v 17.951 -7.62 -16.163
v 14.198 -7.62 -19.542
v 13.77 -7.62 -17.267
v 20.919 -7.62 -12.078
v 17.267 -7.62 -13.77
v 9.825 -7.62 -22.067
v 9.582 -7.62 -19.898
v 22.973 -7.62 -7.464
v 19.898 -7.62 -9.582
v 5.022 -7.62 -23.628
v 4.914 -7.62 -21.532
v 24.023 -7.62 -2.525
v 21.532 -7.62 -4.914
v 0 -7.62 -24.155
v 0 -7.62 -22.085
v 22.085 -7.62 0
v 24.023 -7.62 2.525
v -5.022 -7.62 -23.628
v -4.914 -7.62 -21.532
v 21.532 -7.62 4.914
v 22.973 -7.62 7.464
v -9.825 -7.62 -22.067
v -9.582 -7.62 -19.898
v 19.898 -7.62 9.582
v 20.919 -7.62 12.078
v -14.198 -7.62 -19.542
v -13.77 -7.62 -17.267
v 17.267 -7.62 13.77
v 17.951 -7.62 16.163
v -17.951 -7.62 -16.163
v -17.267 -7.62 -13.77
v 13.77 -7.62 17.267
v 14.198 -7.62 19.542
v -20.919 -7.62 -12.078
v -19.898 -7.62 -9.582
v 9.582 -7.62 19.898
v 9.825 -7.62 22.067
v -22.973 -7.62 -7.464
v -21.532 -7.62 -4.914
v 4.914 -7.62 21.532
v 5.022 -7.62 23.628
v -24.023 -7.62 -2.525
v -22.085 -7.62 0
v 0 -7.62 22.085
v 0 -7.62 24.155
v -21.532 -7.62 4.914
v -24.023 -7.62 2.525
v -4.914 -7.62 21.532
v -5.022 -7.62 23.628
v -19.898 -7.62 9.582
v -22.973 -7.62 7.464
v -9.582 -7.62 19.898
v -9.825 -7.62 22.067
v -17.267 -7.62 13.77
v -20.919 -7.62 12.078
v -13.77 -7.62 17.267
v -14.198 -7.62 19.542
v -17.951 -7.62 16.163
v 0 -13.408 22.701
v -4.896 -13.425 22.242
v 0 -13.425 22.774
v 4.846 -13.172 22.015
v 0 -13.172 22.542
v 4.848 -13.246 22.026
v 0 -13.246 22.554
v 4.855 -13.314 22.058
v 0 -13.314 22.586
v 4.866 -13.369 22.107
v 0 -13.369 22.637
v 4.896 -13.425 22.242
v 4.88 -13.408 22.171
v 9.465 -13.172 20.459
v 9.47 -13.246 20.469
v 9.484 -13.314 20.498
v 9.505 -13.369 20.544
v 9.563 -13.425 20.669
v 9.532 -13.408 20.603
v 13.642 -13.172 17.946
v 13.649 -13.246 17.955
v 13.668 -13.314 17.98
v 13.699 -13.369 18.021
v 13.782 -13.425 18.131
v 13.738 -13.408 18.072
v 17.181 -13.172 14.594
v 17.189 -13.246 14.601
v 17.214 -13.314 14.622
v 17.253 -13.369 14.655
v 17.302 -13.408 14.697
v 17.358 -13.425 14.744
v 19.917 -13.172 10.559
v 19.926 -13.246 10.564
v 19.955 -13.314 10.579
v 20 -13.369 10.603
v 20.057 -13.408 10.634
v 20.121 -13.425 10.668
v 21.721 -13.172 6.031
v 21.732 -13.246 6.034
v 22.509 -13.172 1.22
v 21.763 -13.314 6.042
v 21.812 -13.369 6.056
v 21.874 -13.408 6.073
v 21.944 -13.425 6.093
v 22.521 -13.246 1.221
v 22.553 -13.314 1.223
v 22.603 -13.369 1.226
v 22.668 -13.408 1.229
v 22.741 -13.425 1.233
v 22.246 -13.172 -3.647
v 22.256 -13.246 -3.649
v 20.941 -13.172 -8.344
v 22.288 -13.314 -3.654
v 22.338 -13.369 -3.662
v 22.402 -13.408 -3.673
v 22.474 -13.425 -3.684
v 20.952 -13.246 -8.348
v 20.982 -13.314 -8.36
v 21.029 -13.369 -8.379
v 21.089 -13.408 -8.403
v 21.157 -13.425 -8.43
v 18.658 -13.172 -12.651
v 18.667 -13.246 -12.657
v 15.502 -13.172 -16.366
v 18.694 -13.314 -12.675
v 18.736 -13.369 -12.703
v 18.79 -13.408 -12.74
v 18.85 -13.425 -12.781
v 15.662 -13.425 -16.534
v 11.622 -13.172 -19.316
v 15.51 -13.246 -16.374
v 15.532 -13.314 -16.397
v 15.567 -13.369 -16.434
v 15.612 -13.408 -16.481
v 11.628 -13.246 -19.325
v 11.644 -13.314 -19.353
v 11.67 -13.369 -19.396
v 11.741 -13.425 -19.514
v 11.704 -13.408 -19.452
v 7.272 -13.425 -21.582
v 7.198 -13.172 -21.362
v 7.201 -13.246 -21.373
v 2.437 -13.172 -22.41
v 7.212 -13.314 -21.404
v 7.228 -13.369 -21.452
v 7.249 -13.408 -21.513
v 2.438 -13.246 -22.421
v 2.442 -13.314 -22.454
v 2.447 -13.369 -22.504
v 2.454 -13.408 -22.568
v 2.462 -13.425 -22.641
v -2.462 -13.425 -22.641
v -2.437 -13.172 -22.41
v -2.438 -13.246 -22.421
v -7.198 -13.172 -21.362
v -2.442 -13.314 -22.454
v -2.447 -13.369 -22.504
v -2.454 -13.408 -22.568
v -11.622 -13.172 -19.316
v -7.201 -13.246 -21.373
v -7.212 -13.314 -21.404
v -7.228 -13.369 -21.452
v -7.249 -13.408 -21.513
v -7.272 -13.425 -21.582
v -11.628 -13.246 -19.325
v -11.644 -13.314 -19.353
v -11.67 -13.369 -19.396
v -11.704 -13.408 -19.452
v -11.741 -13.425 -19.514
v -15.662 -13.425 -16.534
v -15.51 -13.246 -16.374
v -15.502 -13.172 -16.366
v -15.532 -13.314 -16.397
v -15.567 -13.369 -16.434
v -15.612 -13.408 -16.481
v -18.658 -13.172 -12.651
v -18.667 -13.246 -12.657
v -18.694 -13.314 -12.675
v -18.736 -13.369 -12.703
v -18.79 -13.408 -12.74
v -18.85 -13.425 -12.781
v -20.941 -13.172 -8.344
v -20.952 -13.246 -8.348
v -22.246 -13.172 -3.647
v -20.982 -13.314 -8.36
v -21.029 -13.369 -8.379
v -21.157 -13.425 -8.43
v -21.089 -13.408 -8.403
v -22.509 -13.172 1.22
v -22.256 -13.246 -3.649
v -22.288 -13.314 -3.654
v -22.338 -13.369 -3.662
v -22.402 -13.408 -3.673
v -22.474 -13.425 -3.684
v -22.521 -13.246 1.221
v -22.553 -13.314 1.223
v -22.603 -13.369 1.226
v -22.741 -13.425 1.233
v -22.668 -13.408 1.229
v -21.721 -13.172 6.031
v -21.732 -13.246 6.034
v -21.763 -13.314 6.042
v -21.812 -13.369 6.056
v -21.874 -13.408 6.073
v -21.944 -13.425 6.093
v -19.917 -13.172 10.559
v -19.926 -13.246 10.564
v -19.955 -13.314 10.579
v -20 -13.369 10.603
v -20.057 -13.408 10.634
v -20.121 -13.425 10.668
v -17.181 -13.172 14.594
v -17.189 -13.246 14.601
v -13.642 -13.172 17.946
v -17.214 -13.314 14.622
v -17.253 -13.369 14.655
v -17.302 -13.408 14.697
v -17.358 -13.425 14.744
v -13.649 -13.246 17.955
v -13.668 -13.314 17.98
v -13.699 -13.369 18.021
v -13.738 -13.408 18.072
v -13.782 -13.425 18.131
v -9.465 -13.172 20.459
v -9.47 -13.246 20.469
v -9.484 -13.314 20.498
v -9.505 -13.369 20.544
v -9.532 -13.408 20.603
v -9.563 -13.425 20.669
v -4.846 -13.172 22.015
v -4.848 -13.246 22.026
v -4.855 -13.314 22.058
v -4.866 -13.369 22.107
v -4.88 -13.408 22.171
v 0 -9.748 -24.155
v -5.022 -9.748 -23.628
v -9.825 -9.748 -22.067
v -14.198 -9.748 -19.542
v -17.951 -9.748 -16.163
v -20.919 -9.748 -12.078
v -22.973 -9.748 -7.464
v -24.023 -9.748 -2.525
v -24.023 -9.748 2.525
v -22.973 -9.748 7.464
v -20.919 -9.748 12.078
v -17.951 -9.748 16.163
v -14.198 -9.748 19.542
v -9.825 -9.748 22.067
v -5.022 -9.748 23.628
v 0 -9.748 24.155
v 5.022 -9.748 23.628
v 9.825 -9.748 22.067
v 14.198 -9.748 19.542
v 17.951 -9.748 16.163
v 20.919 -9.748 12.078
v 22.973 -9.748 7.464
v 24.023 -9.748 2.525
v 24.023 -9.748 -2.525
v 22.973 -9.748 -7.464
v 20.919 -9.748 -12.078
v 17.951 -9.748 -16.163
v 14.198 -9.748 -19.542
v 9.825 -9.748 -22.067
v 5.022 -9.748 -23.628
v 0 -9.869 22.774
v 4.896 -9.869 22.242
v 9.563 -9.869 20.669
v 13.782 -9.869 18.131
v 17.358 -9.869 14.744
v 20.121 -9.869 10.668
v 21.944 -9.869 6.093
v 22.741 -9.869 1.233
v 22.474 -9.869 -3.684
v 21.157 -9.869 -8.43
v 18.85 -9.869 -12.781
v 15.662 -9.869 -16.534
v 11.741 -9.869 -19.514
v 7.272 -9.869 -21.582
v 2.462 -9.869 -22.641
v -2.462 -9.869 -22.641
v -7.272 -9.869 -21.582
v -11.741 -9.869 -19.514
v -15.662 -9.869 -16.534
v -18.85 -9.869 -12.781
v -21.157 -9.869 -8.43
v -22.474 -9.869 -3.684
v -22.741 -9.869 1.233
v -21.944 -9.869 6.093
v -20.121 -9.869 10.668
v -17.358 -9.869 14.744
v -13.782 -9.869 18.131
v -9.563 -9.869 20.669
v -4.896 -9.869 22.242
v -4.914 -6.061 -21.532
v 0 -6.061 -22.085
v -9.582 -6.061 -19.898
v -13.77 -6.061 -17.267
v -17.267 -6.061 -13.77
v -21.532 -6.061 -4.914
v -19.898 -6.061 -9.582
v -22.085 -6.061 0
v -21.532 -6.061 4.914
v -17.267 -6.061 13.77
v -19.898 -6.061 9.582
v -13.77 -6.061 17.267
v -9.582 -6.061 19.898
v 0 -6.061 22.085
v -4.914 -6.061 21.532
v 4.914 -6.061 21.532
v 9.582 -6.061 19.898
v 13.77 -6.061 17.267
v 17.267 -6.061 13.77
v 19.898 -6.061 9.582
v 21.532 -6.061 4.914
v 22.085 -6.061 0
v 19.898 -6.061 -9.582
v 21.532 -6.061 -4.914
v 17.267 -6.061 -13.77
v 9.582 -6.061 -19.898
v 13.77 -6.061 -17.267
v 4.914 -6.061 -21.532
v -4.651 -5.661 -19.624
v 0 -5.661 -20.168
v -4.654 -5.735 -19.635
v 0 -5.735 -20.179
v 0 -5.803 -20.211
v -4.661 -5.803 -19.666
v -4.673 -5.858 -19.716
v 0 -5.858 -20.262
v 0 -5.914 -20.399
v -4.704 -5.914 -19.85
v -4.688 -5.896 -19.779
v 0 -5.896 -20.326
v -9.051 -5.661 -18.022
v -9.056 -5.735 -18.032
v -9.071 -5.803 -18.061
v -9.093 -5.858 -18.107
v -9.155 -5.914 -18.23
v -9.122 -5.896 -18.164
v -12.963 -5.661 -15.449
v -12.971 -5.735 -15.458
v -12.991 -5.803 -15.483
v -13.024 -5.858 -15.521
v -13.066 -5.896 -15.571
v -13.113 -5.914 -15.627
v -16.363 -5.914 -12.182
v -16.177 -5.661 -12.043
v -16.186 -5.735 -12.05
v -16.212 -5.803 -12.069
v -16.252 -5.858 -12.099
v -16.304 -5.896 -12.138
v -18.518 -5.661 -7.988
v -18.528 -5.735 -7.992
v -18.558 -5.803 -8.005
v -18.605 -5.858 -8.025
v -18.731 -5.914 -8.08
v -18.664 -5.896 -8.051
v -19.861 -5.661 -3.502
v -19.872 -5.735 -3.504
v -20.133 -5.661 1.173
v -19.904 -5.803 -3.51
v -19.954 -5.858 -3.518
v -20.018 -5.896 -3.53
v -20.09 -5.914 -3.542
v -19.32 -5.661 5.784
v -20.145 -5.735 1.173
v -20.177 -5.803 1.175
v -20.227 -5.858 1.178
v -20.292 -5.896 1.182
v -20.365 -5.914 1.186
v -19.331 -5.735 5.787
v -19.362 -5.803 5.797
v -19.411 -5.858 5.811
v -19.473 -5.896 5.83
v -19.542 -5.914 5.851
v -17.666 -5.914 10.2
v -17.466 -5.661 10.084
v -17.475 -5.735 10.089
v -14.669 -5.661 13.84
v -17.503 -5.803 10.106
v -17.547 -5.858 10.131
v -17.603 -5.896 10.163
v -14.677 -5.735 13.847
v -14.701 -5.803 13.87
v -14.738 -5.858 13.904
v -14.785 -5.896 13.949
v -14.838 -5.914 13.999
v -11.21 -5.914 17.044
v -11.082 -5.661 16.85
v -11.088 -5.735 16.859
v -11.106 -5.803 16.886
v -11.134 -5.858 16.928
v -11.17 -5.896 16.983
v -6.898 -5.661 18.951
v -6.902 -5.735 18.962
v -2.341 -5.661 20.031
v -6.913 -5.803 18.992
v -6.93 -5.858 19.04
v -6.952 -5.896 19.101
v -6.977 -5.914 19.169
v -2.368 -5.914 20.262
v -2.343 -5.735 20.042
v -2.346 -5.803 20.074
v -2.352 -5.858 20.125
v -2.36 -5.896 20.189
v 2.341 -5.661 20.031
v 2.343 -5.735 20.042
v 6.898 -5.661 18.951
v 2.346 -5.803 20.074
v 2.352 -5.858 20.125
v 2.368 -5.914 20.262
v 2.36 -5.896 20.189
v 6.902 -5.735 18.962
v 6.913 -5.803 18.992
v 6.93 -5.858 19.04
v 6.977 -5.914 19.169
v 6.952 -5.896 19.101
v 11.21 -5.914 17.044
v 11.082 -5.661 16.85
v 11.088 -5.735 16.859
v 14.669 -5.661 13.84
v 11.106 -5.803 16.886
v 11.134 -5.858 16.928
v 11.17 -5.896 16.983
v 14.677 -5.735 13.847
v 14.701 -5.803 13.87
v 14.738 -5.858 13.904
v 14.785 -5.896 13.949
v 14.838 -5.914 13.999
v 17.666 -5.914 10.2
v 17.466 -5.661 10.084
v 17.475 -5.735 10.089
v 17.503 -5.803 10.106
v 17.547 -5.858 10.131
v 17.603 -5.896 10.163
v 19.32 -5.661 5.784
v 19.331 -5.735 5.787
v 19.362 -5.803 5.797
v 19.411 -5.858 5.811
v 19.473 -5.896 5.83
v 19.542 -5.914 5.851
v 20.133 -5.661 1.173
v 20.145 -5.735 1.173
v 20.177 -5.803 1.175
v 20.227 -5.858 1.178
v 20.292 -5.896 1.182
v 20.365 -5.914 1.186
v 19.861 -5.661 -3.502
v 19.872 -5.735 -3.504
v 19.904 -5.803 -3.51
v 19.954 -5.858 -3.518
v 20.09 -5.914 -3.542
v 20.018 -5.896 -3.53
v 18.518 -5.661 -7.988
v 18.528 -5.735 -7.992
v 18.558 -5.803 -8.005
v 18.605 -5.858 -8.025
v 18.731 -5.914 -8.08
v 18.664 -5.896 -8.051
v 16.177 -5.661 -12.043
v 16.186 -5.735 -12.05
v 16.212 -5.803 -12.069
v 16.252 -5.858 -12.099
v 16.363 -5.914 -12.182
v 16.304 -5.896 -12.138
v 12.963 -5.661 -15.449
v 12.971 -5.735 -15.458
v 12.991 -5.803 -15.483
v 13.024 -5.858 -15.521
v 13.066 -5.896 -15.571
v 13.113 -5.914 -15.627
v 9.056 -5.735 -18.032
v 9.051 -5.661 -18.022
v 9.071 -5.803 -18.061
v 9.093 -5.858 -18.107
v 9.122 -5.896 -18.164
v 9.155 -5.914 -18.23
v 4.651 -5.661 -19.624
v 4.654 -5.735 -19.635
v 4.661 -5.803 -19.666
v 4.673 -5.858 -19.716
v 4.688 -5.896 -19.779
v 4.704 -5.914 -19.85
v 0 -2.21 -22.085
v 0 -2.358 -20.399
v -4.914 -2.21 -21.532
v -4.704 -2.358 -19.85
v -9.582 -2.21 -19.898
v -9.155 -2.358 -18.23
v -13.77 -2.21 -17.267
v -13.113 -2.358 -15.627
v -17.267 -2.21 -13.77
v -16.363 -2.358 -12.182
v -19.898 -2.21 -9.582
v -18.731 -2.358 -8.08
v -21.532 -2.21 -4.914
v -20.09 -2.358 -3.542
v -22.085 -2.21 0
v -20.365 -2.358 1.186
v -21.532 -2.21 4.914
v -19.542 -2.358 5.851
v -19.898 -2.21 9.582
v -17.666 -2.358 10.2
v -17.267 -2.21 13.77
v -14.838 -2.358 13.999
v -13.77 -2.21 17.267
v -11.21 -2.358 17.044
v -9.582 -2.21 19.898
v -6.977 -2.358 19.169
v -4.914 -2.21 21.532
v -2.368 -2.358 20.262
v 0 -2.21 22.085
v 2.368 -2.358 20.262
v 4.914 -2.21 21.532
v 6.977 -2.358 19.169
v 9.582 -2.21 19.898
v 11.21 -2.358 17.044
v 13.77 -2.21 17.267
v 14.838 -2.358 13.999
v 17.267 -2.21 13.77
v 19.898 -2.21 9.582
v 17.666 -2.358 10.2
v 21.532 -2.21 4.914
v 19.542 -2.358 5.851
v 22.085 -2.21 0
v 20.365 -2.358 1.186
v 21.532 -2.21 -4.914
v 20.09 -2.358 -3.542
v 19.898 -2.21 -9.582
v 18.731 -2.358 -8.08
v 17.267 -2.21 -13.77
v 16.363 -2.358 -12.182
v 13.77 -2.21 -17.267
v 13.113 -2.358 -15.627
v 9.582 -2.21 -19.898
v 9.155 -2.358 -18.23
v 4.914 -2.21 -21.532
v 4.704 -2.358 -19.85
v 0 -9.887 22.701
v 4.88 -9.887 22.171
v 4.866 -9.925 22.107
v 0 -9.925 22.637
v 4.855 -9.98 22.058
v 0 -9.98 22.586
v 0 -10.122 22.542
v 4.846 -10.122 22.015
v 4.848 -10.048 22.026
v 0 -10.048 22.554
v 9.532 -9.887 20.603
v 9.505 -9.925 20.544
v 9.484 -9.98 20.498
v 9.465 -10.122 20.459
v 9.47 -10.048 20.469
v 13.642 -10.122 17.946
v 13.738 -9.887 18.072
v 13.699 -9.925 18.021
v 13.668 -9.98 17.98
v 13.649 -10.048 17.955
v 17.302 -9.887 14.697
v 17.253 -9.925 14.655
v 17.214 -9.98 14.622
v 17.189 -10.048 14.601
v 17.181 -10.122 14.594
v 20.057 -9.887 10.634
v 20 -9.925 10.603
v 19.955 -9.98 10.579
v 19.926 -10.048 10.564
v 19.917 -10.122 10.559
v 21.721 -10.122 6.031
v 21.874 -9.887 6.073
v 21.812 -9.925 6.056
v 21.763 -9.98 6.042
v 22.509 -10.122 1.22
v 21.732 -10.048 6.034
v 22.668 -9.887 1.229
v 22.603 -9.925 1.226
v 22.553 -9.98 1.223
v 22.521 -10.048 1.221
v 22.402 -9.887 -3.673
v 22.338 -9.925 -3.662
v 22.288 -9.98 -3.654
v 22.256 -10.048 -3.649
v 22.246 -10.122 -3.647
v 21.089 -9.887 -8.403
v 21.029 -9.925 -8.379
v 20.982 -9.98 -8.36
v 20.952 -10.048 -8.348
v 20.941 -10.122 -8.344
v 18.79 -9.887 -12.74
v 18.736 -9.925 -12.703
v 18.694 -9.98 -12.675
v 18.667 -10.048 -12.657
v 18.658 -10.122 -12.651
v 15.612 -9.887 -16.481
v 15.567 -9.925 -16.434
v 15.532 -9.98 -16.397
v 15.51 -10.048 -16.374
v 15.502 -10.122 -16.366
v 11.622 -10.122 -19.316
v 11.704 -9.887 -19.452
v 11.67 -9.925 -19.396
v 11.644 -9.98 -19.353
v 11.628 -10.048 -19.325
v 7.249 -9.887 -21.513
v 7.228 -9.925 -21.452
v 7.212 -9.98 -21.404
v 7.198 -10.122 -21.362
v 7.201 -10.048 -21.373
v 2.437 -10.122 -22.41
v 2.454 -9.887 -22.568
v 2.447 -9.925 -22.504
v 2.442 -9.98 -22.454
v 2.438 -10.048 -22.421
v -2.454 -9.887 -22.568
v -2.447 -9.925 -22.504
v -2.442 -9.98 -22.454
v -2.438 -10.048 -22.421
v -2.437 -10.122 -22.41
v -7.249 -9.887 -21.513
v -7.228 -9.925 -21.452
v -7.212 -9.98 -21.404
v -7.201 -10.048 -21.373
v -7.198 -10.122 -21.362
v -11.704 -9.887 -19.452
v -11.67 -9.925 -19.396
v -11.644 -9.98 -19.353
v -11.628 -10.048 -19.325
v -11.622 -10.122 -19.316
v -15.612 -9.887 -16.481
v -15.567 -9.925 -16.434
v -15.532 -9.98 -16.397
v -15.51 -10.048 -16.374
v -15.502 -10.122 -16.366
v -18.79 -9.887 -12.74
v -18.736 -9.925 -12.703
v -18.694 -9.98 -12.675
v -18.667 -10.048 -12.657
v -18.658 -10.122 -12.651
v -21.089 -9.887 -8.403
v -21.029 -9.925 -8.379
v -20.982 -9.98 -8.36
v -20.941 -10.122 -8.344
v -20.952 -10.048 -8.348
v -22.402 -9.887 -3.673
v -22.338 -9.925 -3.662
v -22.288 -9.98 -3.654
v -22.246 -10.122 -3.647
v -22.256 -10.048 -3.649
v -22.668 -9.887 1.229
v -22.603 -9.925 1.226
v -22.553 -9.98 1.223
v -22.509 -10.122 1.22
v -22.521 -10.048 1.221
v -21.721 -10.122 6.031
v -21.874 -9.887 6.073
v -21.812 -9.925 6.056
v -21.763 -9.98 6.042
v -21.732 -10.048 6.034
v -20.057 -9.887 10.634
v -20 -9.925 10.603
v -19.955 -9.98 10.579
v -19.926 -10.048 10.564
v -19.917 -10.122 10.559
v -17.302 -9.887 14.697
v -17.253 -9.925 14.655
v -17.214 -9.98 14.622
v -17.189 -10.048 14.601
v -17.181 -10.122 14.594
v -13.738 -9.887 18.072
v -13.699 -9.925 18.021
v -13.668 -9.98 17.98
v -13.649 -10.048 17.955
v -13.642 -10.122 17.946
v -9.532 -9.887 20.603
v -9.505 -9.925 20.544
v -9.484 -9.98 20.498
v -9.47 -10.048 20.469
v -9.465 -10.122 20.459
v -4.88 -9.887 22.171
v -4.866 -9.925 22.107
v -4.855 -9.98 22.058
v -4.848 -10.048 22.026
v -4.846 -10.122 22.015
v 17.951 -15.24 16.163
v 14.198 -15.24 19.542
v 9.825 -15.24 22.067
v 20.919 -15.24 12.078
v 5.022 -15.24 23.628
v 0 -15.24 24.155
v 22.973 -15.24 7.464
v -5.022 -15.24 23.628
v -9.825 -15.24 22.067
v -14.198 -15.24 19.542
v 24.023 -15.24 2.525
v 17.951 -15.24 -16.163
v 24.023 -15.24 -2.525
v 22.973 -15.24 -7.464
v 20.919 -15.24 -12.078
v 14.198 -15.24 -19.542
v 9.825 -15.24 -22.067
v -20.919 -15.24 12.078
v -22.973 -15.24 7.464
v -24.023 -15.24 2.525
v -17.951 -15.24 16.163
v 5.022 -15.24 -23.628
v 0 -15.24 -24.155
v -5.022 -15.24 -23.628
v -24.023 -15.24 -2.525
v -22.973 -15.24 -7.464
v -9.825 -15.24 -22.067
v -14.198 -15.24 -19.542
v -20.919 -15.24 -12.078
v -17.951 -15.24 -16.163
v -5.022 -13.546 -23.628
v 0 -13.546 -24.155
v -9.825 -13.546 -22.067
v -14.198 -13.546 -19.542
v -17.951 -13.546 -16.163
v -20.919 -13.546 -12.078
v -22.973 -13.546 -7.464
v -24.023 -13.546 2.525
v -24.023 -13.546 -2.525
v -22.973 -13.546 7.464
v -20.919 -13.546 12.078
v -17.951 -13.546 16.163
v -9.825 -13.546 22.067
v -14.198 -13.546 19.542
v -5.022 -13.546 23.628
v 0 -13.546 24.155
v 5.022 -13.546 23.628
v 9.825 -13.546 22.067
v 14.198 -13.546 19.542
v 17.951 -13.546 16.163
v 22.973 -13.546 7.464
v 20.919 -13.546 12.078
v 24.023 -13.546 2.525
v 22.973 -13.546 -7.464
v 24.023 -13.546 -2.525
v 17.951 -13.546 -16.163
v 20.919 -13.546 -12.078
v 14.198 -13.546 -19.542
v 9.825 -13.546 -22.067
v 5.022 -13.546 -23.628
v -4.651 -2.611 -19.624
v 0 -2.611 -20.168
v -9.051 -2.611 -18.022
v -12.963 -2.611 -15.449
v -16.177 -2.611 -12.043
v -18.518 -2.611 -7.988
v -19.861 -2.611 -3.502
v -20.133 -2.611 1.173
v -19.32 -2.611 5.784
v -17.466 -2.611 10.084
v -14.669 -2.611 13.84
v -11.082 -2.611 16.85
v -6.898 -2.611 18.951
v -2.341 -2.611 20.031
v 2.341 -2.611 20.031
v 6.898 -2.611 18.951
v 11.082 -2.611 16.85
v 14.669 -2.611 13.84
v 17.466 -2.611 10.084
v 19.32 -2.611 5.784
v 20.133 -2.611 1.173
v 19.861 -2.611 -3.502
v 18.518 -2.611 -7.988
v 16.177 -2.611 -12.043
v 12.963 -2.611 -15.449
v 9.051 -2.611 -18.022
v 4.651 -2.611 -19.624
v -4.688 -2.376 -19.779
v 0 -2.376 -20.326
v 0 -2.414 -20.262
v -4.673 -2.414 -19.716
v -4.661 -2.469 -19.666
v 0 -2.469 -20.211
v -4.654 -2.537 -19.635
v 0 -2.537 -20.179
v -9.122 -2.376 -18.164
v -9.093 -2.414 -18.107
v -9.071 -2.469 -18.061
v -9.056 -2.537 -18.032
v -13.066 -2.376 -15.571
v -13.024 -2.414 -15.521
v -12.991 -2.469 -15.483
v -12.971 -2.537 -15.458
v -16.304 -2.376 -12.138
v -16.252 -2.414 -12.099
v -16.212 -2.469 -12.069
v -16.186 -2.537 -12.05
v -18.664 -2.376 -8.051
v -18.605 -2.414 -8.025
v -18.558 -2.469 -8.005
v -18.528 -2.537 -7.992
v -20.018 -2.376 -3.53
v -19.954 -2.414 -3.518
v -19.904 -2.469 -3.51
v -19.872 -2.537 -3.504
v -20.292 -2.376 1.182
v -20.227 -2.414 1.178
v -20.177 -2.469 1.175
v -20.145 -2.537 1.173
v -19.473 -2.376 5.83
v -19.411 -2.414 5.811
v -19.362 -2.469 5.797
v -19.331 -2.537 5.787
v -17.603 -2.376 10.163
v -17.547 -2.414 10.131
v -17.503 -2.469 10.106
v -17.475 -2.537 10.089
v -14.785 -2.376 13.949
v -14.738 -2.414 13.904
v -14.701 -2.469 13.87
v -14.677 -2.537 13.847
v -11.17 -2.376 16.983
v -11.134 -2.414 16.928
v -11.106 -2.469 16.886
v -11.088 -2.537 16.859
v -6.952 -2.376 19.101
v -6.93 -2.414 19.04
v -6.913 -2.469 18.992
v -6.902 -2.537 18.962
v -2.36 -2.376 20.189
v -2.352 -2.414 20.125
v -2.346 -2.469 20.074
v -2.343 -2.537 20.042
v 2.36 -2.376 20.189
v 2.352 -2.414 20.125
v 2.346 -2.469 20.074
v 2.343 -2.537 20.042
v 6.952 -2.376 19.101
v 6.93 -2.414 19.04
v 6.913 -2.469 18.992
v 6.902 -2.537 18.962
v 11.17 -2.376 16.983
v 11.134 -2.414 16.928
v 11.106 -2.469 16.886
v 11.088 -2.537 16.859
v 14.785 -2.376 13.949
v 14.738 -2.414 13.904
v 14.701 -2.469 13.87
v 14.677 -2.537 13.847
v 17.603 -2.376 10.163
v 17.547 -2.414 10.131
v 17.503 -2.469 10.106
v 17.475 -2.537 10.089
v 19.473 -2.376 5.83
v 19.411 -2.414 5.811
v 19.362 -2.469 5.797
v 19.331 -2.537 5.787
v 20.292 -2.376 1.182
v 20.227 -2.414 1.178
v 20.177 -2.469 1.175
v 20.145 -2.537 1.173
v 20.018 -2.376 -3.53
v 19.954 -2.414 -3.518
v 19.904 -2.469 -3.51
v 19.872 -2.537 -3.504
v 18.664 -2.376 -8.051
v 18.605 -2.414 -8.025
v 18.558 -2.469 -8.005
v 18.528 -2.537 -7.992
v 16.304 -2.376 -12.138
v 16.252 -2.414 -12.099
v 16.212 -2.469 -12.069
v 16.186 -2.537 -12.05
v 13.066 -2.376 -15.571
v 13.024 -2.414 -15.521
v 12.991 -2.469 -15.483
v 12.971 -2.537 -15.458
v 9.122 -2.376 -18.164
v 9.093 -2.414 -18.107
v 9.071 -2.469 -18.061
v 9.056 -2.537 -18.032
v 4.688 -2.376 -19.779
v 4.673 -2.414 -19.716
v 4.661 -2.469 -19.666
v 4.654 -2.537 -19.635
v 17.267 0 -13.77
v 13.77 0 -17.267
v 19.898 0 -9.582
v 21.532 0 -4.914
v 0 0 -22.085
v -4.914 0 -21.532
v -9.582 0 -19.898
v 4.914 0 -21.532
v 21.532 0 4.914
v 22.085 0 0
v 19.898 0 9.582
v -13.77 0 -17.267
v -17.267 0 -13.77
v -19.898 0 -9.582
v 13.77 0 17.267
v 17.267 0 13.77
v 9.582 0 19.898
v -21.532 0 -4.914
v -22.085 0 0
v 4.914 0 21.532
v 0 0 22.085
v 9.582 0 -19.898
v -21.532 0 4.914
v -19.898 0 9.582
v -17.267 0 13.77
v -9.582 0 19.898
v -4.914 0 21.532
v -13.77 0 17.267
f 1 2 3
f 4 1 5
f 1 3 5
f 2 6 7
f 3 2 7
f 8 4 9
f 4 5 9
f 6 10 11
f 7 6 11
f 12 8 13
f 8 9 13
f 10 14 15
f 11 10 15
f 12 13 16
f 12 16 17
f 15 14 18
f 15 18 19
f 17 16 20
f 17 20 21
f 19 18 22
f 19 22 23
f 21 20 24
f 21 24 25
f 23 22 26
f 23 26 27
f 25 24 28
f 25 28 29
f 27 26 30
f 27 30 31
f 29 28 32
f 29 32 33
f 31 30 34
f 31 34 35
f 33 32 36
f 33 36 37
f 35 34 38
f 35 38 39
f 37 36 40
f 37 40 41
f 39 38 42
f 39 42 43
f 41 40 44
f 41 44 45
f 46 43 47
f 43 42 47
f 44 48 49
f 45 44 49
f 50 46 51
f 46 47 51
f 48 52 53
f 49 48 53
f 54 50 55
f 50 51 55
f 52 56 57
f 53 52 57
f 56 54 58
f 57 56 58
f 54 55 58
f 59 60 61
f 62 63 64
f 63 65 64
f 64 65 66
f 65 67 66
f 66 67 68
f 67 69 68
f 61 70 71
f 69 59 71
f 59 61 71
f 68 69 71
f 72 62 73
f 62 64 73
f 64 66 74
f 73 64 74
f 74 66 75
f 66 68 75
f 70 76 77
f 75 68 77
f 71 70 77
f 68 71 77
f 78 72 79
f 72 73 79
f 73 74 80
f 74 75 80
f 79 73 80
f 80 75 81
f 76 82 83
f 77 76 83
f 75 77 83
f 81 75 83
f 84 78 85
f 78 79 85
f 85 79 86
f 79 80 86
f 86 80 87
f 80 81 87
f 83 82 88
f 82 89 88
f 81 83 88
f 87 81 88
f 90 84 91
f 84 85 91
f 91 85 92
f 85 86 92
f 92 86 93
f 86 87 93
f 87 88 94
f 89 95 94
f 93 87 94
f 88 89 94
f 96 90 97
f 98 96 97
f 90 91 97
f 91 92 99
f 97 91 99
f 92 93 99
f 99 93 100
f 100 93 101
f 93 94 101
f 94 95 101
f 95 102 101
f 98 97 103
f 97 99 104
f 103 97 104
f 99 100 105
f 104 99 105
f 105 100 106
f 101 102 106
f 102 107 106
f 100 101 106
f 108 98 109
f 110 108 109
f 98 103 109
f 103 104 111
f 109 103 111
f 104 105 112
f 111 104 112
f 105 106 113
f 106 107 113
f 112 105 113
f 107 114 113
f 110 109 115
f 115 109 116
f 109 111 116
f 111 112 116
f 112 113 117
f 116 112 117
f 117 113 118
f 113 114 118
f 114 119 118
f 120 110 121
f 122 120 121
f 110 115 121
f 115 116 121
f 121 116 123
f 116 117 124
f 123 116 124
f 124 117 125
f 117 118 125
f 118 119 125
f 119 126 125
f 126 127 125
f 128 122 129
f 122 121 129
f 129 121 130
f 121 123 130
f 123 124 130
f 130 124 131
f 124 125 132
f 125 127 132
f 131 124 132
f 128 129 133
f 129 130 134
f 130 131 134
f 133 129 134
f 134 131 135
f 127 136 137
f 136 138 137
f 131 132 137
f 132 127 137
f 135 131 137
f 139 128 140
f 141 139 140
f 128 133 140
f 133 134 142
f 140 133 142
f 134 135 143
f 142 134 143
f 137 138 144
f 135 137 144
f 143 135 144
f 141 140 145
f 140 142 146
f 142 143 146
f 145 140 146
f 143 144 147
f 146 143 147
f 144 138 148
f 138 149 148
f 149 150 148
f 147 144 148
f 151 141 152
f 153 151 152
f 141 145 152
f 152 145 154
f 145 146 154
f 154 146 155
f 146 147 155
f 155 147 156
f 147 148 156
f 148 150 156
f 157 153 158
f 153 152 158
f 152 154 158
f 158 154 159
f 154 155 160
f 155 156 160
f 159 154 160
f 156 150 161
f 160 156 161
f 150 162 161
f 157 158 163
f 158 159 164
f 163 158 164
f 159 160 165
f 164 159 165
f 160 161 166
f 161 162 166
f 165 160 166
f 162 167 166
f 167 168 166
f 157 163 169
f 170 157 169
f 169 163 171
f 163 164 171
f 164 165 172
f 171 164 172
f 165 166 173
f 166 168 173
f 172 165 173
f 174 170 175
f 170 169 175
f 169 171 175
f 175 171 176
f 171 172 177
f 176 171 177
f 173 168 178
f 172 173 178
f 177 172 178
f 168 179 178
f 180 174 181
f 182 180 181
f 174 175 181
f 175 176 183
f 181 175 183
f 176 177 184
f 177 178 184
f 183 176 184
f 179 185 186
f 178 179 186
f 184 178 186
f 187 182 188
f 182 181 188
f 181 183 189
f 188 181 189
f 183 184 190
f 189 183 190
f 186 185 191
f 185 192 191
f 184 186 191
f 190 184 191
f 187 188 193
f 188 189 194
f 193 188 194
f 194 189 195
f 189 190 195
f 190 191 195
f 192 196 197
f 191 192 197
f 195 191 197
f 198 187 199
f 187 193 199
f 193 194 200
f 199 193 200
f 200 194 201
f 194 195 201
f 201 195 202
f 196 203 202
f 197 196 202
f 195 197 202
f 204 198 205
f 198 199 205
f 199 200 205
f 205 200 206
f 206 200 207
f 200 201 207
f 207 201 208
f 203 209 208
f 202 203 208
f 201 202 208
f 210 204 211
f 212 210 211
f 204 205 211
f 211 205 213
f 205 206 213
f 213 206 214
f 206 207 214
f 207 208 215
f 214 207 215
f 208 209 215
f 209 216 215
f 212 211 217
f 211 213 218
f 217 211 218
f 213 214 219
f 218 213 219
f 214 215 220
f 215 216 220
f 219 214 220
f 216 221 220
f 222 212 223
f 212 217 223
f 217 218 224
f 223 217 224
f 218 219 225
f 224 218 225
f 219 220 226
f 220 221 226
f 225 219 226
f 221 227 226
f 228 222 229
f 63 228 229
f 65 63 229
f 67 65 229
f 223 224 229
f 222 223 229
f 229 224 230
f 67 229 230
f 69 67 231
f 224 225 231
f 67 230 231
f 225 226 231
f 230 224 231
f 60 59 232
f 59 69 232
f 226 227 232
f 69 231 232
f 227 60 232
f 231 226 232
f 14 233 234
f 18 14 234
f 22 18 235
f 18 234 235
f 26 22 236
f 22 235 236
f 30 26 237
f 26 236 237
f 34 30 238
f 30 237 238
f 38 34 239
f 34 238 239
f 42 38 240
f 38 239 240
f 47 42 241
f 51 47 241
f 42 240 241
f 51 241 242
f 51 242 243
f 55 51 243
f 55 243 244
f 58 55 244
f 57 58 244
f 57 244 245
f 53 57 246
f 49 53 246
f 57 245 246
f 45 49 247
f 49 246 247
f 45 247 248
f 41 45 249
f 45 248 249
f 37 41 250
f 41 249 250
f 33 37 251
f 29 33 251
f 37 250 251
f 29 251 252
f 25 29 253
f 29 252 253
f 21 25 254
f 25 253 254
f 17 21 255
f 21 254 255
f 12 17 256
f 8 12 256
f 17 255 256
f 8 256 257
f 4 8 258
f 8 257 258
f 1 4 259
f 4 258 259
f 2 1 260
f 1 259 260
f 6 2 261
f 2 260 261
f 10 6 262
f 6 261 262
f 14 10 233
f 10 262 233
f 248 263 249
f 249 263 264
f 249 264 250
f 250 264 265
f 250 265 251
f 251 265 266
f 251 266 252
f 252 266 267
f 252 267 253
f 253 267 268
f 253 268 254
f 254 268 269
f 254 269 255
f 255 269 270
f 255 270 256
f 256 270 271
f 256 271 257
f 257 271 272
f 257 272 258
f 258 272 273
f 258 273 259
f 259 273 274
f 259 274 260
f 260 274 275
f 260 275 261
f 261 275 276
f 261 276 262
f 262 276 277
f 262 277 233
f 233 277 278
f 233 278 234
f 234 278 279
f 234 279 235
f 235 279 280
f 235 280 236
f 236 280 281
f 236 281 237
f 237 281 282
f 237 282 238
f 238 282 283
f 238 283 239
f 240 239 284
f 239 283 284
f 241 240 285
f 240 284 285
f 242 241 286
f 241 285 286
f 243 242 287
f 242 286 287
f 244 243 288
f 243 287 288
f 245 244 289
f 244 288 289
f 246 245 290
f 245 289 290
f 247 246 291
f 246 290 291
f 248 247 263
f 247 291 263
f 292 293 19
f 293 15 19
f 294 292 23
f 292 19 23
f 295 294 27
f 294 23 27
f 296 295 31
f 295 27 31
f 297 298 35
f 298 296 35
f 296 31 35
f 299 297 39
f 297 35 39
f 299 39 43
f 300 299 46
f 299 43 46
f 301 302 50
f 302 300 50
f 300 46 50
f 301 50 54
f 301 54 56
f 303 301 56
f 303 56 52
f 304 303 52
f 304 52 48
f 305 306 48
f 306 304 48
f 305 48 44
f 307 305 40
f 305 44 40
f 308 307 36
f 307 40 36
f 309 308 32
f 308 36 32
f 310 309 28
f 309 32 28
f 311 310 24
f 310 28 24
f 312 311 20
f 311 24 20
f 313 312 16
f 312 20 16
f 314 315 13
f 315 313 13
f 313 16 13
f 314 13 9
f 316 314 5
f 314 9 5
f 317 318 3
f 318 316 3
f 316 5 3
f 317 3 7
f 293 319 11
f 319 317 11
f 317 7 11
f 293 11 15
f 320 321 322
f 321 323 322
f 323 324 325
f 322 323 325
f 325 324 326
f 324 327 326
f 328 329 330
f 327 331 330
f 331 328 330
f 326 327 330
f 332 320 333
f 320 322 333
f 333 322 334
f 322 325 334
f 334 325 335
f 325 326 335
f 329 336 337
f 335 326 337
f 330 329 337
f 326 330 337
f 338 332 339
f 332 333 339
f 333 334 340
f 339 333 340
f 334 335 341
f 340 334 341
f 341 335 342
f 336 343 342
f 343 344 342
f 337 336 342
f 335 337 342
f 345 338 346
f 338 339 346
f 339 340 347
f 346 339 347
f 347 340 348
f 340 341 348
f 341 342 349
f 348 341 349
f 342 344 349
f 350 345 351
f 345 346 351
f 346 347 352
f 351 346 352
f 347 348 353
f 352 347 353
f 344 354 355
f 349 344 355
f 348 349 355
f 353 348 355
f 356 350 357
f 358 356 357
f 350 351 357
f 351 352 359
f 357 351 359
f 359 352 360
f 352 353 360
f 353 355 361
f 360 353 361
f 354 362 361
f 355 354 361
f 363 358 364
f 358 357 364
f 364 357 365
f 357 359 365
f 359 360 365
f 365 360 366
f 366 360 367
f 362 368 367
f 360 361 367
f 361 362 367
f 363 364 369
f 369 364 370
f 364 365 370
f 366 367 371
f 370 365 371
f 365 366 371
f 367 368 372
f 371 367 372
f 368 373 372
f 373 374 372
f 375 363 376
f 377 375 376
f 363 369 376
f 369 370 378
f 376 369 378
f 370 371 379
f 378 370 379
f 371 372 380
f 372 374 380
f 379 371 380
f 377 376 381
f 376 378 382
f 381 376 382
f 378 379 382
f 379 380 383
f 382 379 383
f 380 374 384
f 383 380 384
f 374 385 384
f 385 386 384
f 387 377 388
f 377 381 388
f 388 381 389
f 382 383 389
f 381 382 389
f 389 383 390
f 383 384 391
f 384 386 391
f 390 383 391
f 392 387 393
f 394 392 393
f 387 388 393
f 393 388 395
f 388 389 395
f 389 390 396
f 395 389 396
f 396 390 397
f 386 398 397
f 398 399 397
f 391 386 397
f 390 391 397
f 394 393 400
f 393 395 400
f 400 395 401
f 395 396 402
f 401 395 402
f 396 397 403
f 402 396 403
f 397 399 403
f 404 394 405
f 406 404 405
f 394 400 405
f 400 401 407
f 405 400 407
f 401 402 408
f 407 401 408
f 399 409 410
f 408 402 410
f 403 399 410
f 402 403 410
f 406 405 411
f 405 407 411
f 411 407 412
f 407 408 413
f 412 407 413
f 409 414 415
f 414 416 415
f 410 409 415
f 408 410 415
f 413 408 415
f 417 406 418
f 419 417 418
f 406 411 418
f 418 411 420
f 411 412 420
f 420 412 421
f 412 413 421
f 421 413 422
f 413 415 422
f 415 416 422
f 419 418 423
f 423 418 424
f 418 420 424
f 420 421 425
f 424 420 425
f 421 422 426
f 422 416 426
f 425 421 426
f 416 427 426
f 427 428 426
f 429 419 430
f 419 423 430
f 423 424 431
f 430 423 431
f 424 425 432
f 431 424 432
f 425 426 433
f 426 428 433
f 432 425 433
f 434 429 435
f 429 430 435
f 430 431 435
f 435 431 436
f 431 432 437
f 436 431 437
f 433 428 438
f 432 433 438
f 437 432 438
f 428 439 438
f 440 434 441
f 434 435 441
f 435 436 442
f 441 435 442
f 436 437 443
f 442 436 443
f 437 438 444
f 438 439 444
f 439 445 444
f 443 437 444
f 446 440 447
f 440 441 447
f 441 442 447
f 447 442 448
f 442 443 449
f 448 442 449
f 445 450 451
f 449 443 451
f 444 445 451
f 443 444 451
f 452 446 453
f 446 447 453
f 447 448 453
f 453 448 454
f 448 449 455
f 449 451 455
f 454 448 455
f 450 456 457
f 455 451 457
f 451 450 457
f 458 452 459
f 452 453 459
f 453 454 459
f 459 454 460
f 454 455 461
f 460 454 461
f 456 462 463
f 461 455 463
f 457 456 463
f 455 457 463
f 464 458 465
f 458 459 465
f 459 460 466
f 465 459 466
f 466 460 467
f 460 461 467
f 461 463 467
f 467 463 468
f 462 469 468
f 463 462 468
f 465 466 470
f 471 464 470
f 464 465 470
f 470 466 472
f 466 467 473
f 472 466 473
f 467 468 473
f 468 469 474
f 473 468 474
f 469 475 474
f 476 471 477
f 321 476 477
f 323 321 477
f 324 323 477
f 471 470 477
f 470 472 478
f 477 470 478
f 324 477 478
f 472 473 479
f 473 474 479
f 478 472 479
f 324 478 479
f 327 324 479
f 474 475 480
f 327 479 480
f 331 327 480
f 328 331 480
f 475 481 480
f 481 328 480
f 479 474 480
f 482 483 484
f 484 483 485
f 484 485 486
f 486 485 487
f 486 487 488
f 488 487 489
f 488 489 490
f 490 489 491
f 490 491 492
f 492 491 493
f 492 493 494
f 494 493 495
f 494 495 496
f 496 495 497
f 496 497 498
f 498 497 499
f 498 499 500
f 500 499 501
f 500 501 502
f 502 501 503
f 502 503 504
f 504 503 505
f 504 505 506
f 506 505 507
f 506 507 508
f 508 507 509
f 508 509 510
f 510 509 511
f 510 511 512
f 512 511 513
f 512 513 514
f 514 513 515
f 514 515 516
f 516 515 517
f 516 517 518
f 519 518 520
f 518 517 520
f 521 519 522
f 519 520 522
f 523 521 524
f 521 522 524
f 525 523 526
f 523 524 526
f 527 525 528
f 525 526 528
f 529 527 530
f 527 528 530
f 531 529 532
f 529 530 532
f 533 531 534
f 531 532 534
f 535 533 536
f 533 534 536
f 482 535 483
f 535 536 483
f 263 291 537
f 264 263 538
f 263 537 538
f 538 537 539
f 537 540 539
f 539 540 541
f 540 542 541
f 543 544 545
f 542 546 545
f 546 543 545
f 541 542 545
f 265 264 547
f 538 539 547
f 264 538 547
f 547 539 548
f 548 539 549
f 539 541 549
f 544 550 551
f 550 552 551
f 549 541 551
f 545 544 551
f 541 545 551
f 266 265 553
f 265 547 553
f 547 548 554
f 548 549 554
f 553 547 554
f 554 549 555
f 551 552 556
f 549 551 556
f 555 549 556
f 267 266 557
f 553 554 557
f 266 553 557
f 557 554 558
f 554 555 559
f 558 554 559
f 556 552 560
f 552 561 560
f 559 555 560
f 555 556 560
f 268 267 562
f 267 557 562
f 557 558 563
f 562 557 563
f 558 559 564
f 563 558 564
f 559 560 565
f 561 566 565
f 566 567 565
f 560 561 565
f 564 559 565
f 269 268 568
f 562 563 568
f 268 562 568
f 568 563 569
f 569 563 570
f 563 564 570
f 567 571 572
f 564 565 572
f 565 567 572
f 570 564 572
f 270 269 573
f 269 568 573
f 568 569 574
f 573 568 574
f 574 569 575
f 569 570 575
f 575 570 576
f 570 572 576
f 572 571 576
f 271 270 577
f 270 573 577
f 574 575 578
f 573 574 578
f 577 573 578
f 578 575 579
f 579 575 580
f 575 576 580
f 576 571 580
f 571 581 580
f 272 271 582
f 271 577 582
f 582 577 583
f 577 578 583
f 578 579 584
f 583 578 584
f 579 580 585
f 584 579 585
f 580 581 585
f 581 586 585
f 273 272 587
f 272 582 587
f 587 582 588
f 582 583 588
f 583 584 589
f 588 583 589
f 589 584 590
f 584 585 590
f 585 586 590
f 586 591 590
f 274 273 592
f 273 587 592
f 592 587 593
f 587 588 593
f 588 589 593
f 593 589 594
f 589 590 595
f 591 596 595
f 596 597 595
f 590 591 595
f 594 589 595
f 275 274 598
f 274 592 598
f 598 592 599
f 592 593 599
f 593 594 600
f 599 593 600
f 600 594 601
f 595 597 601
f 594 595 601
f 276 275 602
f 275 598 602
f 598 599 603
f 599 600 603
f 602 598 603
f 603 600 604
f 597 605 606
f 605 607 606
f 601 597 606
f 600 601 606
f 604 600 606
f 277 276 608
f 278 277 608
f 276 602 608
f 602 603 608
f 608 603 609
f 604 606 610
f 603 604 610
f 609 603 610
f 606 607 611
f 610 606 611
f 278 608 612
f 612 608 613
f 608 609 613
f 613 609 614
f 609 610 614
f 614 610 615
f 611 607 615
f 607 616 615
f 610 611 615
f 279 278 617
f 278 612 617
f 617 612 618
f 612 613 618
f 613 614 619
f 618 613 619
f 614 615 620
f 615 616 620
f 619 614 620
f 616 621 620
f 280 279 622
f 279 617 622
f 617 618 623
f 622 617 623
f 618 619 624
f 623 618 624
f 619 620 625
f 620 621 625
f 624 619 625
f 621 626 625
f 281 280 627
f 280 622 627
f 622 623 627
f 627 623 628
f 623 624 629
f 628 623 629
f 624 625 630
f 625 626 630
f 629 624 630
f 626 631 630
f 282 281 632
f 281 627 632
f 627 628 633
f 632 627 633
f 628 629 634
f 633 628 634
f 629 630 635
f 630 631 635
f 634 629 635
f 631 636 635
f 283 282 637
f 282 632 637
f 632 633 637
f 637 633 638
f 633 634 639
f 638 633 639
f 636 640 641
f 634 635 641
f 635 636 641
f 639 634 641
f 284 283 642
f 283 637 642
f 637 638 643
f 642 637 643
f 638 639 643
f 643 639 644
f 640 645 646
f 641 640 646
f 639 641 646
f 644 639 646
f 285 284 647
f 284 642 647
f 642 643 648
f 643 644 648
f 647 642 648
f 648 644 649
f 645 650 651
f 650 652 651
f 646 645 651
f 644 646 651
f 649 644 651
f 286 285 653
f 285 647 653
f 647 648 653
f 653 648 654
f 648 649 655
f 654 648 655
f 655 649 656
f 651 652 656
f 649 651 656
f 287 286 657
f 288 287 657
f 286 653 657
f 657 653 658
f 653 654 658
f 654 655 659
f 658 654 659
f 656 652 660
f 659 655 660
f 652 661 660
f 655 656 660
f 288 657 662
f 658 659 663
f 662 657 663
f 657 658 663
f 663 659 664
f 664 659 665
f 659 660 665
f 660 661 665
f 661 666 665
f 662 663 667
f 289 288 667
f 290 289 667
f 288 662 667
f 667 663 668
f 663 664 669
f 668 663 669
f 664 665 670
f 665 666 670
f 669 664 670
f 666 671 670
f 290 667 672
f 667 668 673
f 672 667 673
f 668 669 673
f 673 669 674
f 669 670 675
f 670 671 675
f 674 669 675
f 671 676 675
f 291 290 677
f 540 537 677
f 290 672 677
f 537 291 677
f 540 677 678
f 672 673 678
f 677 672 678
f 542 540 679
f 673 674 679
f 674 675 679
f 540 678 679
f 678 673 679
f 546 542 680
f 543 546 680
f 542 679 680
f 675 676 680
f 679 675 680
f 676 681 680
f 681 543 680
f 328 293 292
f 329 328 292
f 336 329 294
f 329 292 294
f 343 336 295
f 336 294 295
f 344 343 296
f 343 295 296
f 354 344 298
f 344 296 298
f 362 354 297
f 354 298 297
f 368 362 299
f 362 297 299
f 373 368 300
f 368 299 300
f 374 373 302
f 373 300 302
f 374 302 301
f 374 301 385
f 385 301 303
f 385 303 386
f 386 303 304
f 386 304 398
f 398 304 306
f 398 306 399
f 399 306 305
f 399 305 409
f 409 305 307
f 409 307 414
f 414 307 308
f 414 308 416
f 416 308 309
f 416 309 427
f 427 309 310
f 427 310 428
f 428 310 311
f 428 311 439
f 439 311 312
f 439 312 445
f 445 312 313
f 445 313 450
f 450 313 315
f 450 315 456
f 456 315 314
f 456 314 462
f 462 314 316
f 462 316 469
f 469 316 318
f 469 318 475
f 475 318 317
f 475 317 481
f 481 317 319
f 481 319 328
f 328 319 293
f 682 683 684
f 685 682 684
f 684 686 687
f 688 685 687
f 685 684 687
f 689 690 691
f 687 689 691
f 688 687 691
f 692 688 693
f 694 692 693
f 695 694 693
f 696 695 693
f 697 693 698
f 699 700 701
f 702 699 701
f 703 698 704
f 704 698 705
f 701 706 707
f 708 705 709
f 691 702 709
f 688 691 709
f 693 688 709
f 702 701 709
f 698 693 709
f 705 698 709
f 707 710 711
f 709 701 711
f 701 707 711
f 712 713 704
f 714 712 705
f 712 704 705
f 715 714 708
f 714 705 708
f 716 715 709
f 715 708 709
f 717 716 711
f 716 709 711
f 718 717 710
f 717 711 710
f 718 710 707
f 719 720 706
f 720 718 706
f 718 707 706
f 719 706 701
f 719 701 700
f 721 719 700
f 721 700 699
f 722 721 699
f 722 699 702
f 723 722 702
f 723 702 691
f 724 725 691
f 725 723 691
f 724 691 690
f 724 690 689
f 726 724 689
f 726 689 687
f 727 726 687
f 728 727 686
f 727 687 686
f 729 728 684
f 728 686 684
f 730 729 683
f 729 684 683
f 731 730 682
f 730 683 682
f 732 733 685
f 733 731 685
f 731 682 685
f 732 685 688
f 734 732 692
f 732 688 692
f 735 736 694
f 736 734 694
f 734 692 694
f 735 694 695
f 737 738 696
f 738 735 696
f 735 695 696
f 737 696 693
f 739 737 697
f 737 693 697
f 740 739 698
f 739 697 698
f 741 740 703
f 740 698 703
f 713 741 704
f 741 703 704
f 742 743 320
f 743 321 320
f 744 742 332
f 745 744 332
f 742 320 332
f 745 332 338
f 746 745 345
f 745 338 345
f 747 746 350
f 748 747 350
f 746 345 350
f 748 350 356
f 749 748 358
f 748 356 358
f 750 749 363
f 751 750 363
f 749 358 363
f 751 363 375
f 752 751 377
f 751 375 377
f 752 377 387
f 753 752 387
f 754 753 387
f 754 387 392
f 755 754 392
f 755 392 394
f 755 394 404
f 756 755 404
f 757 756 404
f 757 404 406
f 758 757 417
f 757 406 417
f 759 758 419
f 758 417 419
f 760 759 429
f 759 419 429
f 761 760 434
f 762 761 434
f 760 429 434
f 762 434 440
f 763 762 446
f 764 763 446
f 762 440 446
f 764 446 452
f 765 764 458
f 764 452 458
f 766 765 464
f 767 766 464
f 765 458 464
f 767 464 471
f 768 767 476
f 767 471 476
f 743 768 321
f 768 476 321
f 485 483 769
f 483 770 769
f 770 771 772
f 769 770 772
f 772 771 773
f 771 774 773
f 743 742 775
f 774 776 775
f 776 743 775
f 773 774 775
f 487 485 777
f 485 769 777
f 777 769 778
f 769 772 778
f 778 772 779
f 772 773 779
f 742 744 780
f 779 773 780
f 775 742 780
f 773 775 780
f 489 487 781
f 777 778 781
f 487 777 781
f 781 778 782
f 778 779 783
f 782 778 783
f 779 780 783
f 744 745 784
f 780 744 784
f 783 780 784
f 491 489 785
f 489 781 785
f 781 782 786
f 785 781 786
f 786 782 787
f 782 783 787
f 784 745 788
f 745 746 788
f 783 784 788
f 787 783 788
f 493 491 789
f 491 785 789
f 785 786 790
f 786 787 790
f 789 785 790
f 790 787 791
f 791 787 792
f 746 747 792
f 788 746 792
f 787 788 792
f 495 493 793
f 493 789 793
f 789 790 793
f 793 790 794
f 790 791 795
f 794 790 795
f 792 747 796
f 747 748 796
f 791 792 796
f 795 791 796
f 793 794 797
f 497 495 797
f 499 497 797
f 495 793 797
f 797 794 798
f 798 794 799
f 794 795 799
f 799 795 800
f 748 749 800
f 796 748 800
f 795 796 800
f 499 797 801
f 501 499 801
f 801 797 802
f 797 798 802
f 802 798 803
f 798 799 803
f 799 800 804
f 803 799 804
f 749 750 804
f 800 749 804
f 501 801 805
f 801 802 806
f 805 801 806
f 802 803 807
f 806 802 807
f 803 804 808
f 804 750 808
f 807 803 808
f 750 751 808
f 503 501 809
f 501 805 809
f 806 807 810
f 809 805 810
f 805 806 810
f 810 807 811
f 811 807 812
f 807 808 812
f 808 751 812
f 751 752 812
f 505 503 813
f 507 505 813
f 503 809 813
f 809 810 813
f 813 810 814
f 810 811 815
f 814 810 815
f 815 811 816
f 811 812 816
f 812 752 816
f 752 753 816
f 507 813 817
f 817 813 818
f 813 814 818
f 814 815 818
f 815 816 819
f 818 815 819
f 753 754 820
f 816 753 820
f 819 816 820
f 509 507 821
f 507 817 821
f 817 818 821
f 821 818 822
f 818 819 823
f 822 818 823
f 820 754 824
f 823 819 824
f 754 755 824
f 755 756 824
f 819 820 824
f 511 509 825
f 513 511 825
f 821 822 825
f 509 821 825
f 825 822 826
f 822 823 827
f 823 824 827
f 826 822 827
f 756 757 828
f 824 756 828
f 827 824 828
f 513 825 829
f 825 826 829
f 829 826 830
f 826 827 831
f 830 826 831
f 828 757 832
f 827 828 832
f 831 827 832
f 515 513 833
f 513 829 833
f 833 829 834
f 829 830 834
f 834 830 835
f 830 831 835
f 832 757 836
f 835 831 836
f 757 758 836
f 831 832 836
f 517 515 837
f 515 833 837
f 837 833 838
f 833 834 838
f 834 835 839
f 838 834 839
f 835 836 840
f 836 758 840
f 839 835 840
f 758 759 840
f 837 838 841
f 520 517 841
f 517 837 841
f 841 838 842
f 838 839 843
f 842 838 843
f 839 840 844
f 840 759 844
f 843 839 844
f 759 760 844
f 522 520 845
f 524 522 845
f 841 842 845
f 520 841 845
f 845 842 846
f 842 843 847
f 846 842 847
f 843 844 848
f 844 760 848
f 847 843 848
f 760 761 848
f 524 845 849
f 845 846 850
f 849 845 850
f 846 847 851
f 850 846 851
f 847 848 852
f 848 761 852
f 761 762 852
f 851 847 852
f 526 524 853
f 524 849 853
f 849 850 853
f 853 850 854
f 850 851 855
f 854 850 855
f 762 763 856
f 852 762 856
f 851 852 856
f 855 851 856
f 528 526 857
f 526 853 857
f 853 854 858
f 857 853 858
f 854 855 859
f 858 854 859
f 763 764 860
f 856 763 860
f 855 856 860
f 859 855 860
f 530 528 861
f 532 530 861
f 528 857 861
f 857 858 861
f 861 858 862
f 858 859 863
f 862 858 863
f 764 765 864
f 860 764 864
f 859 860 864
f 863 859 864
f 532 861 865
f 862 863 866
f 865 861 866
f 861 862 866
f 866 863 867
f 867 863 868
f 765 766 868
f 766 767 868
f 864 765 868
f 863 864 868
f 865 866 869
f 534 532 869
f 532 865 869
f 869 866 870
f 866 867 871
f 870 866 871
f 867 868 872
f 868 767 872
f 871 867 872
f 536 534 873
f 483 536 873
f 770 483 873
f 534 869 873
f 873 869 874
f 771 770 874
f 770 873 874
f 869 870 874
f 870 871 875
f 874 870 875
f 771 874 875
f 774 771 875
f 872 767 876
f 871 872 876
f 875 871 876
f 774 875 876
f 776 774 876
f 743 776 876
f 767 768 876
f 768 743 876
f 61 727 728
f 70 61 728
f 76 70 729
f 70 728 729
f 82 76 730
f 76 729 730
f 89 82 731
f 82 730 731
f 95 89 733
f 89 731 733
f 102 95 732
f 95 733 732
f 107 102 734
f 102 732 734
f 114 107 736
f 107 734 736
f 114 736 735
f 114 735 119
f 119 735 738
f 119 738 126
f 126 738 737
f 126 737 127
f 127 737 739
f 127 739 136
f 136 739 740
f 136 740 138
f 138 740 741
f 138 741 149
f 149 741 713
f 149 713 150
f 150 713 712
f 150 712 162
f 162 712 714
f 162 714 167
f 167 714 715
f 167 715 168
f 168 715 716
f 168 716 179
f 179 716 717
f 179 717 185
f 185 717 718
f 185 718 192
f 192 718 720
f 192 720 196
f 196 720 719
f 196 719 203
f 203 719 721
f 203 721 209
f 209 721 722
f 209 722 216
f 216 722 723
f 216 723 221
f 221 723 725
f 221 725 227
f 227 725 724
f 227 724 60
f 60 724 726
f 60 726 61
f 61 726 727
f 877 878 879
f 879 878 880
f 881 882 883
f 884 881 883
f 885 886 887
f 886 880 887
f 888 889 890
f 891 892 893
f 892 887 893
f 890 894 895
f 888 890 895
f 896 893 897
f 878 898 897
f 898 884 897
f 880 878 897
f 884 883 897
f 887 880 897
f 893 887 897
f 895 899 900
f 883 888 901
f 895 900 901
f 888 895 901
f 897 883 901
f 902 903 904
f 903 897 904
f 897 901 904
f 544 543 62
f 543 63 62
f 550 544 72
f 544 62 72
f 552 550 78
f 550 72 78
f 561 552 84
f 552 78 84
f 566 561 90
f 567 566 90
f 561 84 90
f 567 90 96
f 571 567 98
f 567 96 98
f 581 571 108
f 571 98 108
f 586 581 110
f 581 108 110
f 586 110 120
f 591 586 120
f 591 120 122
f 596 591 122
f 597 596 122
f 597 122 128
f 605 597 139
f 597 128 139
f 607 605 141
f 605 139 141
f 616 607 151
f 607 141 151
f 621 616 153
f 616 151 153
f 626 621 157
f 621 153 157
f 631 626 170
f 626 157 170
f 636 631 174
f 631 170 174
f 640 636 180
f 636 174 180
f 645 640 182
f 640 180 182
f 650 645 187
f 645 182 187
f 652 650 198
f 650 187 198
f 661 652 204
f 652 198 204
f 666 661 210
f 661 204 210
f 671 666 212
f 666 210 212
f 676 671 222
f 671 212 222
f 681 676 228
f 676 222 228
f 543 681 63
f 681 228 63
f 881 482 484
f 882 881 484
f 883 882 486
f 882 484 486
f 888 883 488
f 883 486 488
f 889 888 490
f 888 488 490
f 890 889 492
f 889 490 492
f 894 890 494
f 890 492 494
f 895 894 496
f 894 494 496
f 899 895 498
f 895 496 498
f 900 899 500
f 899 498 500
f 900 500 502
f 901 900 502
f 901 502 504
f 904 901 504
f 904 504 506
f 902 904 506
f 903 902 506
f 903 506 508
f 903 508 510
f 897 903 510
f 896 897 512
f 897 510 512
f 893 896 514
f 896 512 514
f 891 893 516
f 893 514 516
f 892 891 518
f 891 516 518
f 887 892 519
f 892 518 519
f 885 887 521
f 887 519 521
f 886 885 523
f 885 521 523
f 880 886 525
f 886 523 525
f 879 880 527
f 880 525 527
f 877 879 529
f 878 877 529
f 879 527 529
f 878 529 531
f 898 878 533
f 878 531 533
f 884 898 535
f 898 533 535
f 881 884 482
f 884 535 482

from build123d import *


with BuildPart() as part:
    # Sketch1 → Revolve1 (revolve)
    with BuildSketch(Plane.XY, mode=Mode.PRIVATE) as revolve1_sk:
        Polygon((-22.0853, 0), (-22.0853, -7.62), (-24.1554, -7.62), (-24.1554, -15.24), (0, -15.24), (0, 0), align=None)
    revolve(revolve1_sk.sketch.rotate(Axis((0, 0, 0), (0, 1, 0)), 270), axis=Axis((0, 0, 0), (0, 1, 0)))

    # Sketch7 → Groove for AS 568-132, O-Ring1 (revolve, cut)
    with BuildSketch(Plane(origin=(0, 0, 0), x_dir=(0, 0, -1), z_dir=(-1, 0, 0)), mode=Mode.PRIVATE) as groove_for_as_568_132_o_ring1_sk:
        with BuildLine():
            Line((22.774362441, 13.425029581), (24.6888, 13.592521165))
            Line((24.6888, 13.592521165), (24.6888, 9.701537998))
            Line((24.6888, 9.701537998), (22.774362441, 9.869029581))
            ThreePointArc((22.774362441, 9.869029581), (22.609231556, 9.950463122), (22.5425, 10.122063035))
            Line((22.5425, 10.122063035), (22.5425, 13.171996128))
            ThreePointArc((22.5425, 13.171996128), (22.609231556, 13.343596041), (22.774362441, 13.425029581))
        make_face()
    revolve(groove_for_as_568_132_o_ring1_sk.sketch.rotate(Axis((0, -50, 0), (0, 1, 0)), 180), axis=Axis((0, -50, 0), (0, 1, 0)), mode=Mode.SUBTRACT)

    # Sketch9 → Groove for AS 568-129, O-Ring1 (revolve, cut)
    with BuildSketch(Plane(origin=(0, 0, 0), x_dir=(0, 0, -1), z_dir=(-1, 0, 0))):
        with BuildLine():
            Line((20.399462441, 5.913991542), (22.3139, 6.081483126))
            Line((22.3139, 6.081483126), (22.3139, 2.190499959))
            Line((22.3139, 2.190499959), (20.399462441, 2.357991542))
            ThreePointArc((20.399462441, 2.357991542), (20.234331556, 2.439425083), (20.1676, 2.611024996))
            Line((20.1676, 2.611024996), (20.1676, 5.660958089))
            ThreePointArc((20.1676, 5.660958089), (20.234331556, 5.832558002), (20.399462441, 5.913991542))
        make_face()
    revolve(axis=Axis((0, -50, 0), (0, 1, 0)), mode=Mode.SUBTRACT)


solid = part.part
